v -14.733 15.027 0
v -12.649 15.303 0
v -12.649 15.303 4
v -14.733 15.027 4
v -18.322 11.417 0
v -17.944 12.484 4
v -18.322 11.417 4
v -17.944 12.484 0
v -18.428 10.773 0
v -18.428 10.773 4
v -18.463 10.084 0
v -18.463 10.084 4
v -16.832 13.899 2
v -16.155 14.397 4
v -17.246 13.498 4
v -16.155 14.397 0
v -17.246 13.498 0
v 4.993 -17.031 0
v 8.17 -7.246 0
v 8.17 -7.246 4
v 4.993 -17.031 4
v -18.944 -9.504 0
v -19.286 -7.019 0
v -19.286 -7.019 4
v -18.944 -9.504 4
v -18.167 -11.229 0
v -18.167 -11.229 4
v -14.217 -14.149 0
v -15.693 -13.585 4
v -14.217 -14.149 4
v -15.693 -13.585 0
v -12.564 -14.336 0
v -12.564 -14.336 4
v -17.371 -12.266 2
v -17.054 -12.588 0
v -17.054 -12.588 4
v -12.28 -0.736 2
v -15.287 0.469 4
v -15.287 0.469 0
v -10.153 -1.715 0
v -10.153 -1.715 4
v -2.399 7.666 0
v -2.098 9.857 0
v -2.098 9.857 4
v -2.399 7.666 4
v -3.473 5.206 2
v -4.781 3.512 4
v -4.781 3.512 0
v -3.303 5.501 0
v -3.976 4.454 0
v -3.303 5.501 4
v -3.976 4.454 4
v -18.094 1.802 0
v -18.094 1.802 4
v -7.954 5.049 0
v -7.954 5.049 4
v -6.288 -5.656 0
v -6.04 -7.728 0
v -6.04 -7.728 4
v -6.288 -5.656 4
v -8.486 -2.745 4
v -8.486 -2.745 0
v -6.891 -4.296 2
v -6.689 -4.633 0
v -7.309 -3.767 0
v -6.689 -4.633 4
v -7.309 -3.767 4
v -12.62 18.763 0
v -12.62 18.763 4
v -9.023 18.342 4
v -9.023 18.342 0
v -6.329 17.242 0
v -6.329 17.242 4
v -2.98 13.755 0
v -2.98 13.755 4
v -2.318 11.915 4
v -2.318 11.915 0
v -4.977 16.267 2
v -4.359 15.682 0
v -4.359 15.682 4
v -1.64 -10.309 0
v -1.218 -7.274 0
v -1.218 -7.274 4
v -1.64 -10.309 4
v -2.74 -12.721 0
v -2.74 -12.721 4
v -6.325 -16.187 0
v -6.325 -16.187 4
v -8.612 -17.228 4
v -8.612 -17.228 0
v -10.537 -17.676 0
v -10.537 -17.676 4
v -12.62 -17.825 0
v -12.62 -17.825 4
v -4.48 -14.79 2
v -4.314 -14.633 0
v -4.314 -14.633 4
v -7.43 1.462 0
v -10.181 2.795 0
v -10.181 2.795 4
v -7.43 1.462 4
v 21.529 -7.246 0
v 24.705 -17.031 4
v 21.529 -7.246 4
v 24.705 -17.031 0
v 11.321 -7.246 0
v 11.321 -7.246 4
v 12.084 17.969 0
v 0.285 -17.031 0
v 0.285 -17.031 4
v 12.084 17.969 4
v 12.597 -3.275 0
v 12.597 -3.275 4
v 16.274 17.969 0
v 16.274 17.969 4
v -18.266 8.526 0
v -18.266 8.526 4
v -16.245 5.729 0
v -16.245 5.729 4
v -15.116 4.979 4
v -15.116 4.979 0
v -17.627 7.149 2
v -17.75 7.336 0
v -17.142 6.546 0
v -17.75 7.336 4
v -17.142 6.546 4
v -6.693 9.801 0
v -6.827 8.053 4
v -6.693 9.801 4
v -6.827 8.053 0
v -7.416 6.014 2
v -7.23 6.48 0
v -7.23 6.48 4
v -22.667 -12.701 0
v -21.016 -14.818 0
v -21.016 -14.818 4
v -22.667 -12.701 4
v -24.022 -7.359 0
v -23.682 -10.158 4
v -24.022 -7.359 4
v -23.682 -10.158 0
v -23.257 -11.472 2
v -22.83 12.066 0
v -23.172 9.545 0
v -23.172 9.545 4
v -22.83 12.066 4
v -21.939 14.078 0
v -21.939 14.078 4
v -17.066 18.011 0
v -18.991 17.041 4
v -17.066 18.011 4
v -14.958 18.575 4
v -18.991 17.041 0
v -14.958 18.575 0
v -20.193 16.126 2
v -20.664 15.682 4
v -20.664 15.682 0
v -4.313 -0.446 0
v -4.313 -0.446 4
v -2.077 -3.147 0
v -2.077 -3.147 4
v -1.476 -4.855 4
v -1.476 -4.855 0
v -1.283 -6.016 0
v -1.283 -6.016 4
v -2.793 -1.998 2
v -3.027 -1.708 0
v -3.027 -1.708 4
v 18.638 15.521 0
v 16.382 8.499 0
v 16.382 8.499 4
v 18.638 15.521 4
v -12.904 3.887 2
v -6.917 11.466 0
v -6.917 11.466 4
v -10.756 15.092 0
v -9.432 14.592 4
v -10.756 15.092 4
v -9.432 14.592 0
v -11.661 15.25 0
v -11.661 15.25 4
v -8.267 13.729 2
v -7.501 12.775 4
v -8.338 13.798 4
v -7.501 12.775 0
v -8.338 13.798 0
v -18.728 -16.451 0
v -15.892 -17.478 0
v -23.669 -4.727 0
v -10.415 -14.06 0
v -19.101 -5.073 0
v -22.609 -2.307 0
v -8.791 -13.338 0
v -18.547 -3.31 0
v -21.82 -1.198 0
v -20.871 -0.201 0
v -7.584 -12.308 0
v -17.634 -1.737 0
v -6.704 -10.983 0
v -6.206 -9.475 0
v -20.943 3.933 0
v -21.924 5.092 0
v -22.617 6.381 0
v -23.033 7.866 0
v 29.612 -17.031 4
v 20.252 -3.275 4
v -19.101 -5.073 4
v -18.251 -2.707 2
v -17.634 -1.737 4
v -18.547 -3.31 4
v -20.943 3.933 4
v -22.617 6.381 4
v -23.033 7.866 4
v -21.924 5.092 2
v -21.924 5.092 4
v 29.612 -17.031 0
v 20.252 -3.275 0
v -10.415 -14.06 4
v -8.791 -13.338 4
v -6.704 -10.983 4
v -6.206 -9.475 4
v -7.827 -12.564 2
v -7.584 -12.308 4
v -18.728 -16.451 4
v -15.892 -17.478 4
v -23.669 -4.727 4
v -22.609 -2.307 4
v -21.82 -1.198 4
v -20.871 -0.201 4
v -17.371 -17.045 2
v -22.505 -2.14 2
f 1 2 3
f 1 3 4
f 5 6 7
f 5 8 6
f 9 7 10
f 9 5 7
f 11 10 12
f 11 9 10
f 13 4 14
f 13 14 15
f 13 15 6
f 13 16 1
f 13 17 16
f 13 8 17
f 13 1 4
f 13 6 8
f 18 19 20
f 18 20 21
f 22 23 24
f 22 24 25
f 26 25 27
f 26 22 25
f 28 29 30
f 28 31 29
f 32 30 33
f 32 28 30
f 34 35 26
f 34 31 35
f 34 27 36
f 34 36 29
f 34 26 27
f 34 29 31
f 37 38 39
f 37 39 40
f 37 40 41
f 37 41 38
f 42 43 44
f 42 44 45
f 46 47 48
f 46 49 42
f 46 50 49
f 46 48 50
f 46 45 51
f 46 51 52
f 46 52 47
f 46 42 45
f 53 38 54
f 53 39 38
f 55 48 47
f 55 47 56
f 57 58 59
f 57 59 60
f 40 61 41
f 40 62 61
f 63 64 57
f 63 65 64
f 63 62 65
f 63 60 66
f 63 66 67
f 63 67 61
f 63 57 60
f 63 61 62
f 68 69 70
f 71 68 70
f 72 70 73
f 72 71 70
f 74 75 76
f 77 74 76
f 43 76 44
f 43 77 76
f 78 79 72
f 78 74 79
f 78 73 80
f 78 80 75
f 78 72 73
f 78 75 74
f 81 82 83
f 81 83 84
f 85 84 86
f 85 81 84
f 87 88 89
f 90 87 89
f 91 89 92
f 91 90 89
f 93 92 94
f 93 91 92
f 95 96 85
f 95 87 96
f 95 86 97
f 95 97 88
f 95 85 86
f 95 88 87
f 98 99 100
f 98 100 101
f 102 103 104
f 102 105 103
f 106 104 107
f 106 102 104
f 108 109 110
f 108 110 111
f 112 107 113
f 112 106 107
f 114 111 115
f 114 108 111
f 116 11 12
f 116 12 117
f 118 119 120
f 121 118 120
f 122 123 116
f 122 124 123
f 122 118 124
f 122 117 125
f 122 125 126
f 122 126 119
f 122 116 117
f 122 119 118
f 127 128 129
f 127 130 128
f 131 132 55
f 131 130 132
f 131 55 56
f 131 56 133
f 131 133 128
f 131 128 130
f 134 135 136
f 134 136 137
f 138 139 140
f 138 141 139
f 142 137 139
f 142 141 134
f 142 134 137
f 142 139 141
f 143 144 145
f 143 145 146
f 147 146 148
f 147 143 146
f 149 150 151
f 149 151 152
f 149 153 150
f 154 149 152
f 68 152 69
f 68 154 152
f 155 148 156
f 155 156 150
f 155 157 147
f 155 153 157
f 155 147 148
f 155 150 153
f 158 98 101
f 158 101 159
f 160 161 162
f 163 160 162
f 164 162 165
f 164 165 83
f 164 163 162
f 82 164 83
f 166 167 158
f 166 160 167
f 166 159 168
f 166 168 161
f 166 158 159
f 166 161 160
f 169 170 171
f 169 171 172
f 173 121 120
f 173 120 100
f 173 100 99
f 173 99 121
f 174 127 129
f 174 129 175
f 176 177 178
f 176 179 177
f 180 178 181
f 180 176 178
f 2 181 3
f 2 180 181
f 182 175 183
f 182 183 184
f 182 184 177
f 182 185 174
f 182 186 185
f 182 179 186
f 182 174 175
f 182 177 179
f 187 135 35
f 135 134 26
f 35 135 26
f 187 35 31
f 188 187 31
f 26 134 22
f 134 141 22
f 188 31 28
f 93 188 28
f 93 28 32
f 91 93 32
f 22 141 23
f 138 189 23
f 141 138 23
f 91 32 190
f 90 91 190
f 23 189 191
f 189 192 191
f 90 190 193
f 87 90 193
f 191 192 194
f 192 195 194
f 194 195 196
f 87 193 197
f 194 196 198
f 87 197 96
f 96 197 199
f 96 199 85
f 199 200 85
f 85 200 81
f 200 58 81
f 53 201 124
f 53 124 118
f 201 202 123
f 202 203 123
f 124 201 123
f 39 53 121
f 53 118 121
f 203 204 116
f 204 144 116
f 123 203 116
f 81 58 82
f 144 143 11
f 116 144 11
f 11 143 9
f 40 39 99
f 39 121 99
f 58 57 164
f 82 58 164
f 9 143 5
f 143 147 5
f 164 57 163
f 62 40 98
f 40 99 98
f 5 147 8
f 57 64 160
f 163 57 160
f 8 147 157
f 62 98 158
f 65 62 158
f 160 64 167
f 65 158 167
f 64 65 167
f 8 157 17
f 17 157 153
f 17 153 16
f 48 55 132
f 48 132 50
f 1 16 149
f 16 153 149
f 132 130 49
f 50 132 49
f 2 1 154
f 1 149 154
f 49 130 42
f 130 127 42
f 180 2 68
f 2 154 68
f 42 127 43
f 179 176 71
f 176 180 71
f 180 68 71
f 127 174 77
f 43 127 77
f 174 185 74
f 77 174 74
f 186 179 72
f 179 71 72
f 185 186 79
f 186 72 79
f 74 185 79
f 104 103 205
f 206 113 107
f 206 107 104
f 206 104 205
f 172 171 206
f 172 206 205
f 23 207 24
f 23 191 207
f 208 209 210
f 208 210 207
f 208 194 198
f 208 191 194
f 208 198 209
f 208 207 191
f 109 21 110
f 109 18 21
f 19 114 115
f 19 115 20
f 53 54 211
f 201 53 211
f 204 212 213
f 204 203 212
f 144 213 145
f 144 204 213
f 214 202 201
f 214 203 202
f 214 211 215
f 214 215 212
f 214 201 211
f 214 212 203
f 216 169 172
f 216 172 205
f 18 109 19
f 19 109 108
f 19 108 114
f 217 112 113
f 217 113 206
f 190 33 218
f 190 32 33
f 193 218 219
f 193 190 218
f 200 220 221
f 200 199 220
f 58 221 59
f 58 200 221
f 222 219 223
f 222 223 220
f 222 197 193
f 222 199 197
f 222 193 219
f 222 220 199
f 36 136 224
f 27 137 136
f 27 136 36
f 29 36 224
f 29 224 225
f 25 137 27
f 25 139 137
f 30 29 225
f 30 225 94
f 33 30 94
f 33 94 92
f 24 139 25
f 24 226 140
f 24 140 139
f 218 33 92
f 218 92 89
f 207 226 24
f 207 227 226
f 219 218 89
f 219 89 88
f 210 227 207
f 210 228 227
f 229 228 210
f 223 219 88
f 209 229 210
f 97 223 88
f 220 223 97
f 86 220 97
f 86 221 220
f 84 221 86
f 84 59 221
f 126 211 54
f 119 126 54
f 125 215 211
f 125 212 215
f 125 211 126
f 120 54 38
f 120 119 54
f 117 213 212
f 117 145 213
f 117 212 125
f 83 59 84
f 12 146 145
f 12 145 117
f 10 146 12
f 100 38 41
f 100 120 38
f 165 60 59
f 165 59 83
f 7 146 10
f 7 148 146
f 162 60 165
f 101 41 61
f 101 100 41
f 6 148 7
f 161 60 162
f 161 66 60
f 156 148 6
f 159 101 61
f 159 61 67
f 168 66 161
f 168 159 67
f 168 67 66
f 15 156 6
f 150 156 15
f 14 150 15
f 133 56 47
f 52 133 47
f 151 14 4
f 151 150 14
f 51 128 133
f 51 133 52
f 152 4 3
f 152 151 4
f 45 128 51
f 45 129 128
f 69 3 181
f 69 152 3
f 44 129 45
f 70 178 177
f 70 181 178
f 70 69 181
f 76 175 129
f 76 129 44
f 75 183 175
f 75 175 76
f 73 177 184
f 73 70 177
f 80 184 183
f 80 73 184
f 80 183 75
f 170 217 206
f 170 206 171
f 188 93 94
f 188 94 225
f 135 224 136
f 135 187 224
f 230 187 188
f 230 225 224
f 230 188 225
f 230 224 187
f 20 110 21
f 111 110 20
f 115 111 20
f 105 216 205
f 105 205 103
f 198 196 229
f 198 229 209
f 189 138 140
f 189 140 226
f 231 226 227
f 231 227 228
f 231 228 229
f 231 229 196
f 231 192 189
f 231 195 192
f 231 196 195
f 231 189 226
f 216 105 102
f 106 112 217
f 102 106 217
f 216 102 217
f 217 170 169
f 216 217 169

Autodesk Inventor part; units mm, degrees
ref_plane "YZ Plane" through (0, 0, 0) normal (1, 0, 0) x (0, 1, 0)
ref_plane "XZ Plane" through (0, 0, 0) normal (0, 1, 0) x (-1, 0, 0)
ref_plane "XY Plane" through (0, 0, 0) normal (0, 0, 1) x (1, 0, 0)
sketch "Эскиз1" plane through (0, 0, 0) normal (0, 0, 1) x (1, 0, 0)
  line L0 (12.5971, -3.2747) -> (20.2523, -3.2747)
  line L1 (20.2523, -3.2747) -> (16.3816, 8.4993)
  line L2 (16.3816, 8.4993) -> (18.6385, 15.5206)
  line L3 (18.6385, 15.5206) -> (29.6121, -17.0308)
  line L4 (29.6121, -17.0308) -> (24.7053, -17.0308)
  line L5 (24.7053, -17.0308) -> (21.5286, -7.2456)
  line L6 (21.5286, -7.2456) -> (11.3208, -7.2456)
  line L7 (11.3208, -7.2456) -> (12.5971, -3.2747)
  line L8 (16.2744, 17.9692) -> (8.1696, -7.2456)
  line L9 (8.1696, -7.2456) -> (4.993, -17.0308)
  line L10 (4.993, -17.0308) -> (0.2847, -17.0308)
  line L11 (0.2847, -17.0308) -> (12.0837, 17.9692)
  line L12 (12.0837, 17.9692) -> (16.2744, 17.9692)
  spline S0 degree 2 poles (-6.6926, 9.8006) (-6.6926, 12.1548) (-9.8409, 15.3031) (-12.6488, 15.3031) knots 0 0 0 1 2 2 2
  spline S1 degree 2 poles (-12.6488, 15.3031) (-15.2015, 15.3031) (-18.4633, 12.4951) (-18.4633, 10.0843) knots 0 0 0 1 2 2 2
  spline S2 degree 2 poles (-18.4633, 10.0843) (-18.4633, 8.3541) (-16.7898, 5.9432) (-15.1164, 4.9789) knots 0 0 0 1 2 2 2
  spline S3 degree 2 poles (-15.1164, 4.9789) (-14.4074, 4.5818) (-11.4009, 3.192) (-10.1813, 2.7949) knots 0 0 0 1 2 2 2
  line L13 (-10.1813, 2.7949) -> (-7.43, 1.4619)
  spline S4 degree 2 poles (-7.43, 1.4619) (-4.3668, 0.0437) (-1.2185, -4.0405) (-1.2185, -7.2739) knots 0 0 0 1 2 2 2
  spline S5 degree 2 poles (-1.2185, -7.2739) (-1.2185, -11.7553) (-7.742, -17.825) (-12.6205, -17.825) knots 0 0 0 1 2 2 2
  spline S6 degree 2 poles (-12.6205, -17.825) (-15.2299, -17.825) (-19.5127, -16.265) (-21.0159, -14.8185) knots 0 0 0 1 2 2 2
  spline S7 degree 2 poles (-21.0159, -14.8185) (-22.4908, -13.4004) (-24.0224, -9.543) (-24.0224, -7.359) knots 0 0 0 1 2 2 2
  spline S8 degree 2 poles (-24.0224, -7.359) (-24.0224, -4.5227) (-21.8258, -1.0738) (-20.871, -0.2006) knots 0 0 0 1 1.44761 1.44761 1.44761
  line L14 (-20.871, -0.2006) -> (-17.6341, -1.7373)
  spline S9 degree 2 poles (-17.6341, -1.7373) (-17.9742, -2.2001) (-19.2858, -4.6078) (-19.2858, -7.0187) knots 0.733023 0.733023 0.733023 1 2 2 2
  spline S10 degree 2 poles (-19.2858, -7.0187) (-19.2858, -10.1953) (-15.4568, -14.3363) (-12.5638, -14.3363) knots 0 0 0 1 2 2 2
  spline S11 degree 2 poles (-12.5638, -14.3363) (-9.614, -14.3363) (-6.0403, -10.791) (-6.0403, -7.7277) knots 0 0 0 1 2 2 2
  spline S12 degree 2 poles (-6.0403, -7.7277) (-6.0403, -5.5722) (-7.742, -3.0195) (-10.1529, -1.7148) knots 0 0 0 1 2 2 2
  spline S13 degree 2 poles (-10.1529, -1.7148) (-10.9471, -1.261) (-13.6132, -0.2115) (-15.2866, 0.4692) knots 0 0 0 1 2 2 2
  line L15 (-15.2866, 0.4692) -> (-18.0945, 1.8022)
  spline S14 degree 2 poles (-18.0945, 1.8022) (-20.6756, 3.3055) (-23.1715, 6.8792) (-23.1715, 9.5454) knots 0 0 0 1 2 2 2
  spline S15 degree 2 poles (-23.1715, 9.5454) (-23.1715, 13.4878) (-17.2153, 18.7633) (-12.6205, 18.7633) knots 0 0 0 1 2 2 2
  spline S16 degree 2 poles (-12.6205, 18.7633) (-7.8555, 18.7633) (-2.0978, 13.7714) (-2.0978, 9.8573) knots 0 0 0 1 2 2 2
  spline S17 degree 2 poles (-2.0978, 9.8573) (-2.0978, 7.5032) (-4.029, 4.278) (-4.7812, 3.512) knots 0 0 0 1 1.403871 1.403871 1.403871
  line L16 (-4.7812, 3.512) -> (-7.9537, 5.0492)
  spline S18 degree 2 poles (-7.9537, 5.0492) (-7.628, 5.5274) (-6.6926, 7.6734) (-6.6926, 9.8006) knots 0.706651 0.706651 0.706651 1 2 2 2
  point P0 (0, 0)
  point P1 (1.7035, -0.9566)
  point P2 (1.7035, -0.9566)
extrude "Выдавливание1" add sketch "Эскиз1" along normal blind 4
properties part number "8А встав"
